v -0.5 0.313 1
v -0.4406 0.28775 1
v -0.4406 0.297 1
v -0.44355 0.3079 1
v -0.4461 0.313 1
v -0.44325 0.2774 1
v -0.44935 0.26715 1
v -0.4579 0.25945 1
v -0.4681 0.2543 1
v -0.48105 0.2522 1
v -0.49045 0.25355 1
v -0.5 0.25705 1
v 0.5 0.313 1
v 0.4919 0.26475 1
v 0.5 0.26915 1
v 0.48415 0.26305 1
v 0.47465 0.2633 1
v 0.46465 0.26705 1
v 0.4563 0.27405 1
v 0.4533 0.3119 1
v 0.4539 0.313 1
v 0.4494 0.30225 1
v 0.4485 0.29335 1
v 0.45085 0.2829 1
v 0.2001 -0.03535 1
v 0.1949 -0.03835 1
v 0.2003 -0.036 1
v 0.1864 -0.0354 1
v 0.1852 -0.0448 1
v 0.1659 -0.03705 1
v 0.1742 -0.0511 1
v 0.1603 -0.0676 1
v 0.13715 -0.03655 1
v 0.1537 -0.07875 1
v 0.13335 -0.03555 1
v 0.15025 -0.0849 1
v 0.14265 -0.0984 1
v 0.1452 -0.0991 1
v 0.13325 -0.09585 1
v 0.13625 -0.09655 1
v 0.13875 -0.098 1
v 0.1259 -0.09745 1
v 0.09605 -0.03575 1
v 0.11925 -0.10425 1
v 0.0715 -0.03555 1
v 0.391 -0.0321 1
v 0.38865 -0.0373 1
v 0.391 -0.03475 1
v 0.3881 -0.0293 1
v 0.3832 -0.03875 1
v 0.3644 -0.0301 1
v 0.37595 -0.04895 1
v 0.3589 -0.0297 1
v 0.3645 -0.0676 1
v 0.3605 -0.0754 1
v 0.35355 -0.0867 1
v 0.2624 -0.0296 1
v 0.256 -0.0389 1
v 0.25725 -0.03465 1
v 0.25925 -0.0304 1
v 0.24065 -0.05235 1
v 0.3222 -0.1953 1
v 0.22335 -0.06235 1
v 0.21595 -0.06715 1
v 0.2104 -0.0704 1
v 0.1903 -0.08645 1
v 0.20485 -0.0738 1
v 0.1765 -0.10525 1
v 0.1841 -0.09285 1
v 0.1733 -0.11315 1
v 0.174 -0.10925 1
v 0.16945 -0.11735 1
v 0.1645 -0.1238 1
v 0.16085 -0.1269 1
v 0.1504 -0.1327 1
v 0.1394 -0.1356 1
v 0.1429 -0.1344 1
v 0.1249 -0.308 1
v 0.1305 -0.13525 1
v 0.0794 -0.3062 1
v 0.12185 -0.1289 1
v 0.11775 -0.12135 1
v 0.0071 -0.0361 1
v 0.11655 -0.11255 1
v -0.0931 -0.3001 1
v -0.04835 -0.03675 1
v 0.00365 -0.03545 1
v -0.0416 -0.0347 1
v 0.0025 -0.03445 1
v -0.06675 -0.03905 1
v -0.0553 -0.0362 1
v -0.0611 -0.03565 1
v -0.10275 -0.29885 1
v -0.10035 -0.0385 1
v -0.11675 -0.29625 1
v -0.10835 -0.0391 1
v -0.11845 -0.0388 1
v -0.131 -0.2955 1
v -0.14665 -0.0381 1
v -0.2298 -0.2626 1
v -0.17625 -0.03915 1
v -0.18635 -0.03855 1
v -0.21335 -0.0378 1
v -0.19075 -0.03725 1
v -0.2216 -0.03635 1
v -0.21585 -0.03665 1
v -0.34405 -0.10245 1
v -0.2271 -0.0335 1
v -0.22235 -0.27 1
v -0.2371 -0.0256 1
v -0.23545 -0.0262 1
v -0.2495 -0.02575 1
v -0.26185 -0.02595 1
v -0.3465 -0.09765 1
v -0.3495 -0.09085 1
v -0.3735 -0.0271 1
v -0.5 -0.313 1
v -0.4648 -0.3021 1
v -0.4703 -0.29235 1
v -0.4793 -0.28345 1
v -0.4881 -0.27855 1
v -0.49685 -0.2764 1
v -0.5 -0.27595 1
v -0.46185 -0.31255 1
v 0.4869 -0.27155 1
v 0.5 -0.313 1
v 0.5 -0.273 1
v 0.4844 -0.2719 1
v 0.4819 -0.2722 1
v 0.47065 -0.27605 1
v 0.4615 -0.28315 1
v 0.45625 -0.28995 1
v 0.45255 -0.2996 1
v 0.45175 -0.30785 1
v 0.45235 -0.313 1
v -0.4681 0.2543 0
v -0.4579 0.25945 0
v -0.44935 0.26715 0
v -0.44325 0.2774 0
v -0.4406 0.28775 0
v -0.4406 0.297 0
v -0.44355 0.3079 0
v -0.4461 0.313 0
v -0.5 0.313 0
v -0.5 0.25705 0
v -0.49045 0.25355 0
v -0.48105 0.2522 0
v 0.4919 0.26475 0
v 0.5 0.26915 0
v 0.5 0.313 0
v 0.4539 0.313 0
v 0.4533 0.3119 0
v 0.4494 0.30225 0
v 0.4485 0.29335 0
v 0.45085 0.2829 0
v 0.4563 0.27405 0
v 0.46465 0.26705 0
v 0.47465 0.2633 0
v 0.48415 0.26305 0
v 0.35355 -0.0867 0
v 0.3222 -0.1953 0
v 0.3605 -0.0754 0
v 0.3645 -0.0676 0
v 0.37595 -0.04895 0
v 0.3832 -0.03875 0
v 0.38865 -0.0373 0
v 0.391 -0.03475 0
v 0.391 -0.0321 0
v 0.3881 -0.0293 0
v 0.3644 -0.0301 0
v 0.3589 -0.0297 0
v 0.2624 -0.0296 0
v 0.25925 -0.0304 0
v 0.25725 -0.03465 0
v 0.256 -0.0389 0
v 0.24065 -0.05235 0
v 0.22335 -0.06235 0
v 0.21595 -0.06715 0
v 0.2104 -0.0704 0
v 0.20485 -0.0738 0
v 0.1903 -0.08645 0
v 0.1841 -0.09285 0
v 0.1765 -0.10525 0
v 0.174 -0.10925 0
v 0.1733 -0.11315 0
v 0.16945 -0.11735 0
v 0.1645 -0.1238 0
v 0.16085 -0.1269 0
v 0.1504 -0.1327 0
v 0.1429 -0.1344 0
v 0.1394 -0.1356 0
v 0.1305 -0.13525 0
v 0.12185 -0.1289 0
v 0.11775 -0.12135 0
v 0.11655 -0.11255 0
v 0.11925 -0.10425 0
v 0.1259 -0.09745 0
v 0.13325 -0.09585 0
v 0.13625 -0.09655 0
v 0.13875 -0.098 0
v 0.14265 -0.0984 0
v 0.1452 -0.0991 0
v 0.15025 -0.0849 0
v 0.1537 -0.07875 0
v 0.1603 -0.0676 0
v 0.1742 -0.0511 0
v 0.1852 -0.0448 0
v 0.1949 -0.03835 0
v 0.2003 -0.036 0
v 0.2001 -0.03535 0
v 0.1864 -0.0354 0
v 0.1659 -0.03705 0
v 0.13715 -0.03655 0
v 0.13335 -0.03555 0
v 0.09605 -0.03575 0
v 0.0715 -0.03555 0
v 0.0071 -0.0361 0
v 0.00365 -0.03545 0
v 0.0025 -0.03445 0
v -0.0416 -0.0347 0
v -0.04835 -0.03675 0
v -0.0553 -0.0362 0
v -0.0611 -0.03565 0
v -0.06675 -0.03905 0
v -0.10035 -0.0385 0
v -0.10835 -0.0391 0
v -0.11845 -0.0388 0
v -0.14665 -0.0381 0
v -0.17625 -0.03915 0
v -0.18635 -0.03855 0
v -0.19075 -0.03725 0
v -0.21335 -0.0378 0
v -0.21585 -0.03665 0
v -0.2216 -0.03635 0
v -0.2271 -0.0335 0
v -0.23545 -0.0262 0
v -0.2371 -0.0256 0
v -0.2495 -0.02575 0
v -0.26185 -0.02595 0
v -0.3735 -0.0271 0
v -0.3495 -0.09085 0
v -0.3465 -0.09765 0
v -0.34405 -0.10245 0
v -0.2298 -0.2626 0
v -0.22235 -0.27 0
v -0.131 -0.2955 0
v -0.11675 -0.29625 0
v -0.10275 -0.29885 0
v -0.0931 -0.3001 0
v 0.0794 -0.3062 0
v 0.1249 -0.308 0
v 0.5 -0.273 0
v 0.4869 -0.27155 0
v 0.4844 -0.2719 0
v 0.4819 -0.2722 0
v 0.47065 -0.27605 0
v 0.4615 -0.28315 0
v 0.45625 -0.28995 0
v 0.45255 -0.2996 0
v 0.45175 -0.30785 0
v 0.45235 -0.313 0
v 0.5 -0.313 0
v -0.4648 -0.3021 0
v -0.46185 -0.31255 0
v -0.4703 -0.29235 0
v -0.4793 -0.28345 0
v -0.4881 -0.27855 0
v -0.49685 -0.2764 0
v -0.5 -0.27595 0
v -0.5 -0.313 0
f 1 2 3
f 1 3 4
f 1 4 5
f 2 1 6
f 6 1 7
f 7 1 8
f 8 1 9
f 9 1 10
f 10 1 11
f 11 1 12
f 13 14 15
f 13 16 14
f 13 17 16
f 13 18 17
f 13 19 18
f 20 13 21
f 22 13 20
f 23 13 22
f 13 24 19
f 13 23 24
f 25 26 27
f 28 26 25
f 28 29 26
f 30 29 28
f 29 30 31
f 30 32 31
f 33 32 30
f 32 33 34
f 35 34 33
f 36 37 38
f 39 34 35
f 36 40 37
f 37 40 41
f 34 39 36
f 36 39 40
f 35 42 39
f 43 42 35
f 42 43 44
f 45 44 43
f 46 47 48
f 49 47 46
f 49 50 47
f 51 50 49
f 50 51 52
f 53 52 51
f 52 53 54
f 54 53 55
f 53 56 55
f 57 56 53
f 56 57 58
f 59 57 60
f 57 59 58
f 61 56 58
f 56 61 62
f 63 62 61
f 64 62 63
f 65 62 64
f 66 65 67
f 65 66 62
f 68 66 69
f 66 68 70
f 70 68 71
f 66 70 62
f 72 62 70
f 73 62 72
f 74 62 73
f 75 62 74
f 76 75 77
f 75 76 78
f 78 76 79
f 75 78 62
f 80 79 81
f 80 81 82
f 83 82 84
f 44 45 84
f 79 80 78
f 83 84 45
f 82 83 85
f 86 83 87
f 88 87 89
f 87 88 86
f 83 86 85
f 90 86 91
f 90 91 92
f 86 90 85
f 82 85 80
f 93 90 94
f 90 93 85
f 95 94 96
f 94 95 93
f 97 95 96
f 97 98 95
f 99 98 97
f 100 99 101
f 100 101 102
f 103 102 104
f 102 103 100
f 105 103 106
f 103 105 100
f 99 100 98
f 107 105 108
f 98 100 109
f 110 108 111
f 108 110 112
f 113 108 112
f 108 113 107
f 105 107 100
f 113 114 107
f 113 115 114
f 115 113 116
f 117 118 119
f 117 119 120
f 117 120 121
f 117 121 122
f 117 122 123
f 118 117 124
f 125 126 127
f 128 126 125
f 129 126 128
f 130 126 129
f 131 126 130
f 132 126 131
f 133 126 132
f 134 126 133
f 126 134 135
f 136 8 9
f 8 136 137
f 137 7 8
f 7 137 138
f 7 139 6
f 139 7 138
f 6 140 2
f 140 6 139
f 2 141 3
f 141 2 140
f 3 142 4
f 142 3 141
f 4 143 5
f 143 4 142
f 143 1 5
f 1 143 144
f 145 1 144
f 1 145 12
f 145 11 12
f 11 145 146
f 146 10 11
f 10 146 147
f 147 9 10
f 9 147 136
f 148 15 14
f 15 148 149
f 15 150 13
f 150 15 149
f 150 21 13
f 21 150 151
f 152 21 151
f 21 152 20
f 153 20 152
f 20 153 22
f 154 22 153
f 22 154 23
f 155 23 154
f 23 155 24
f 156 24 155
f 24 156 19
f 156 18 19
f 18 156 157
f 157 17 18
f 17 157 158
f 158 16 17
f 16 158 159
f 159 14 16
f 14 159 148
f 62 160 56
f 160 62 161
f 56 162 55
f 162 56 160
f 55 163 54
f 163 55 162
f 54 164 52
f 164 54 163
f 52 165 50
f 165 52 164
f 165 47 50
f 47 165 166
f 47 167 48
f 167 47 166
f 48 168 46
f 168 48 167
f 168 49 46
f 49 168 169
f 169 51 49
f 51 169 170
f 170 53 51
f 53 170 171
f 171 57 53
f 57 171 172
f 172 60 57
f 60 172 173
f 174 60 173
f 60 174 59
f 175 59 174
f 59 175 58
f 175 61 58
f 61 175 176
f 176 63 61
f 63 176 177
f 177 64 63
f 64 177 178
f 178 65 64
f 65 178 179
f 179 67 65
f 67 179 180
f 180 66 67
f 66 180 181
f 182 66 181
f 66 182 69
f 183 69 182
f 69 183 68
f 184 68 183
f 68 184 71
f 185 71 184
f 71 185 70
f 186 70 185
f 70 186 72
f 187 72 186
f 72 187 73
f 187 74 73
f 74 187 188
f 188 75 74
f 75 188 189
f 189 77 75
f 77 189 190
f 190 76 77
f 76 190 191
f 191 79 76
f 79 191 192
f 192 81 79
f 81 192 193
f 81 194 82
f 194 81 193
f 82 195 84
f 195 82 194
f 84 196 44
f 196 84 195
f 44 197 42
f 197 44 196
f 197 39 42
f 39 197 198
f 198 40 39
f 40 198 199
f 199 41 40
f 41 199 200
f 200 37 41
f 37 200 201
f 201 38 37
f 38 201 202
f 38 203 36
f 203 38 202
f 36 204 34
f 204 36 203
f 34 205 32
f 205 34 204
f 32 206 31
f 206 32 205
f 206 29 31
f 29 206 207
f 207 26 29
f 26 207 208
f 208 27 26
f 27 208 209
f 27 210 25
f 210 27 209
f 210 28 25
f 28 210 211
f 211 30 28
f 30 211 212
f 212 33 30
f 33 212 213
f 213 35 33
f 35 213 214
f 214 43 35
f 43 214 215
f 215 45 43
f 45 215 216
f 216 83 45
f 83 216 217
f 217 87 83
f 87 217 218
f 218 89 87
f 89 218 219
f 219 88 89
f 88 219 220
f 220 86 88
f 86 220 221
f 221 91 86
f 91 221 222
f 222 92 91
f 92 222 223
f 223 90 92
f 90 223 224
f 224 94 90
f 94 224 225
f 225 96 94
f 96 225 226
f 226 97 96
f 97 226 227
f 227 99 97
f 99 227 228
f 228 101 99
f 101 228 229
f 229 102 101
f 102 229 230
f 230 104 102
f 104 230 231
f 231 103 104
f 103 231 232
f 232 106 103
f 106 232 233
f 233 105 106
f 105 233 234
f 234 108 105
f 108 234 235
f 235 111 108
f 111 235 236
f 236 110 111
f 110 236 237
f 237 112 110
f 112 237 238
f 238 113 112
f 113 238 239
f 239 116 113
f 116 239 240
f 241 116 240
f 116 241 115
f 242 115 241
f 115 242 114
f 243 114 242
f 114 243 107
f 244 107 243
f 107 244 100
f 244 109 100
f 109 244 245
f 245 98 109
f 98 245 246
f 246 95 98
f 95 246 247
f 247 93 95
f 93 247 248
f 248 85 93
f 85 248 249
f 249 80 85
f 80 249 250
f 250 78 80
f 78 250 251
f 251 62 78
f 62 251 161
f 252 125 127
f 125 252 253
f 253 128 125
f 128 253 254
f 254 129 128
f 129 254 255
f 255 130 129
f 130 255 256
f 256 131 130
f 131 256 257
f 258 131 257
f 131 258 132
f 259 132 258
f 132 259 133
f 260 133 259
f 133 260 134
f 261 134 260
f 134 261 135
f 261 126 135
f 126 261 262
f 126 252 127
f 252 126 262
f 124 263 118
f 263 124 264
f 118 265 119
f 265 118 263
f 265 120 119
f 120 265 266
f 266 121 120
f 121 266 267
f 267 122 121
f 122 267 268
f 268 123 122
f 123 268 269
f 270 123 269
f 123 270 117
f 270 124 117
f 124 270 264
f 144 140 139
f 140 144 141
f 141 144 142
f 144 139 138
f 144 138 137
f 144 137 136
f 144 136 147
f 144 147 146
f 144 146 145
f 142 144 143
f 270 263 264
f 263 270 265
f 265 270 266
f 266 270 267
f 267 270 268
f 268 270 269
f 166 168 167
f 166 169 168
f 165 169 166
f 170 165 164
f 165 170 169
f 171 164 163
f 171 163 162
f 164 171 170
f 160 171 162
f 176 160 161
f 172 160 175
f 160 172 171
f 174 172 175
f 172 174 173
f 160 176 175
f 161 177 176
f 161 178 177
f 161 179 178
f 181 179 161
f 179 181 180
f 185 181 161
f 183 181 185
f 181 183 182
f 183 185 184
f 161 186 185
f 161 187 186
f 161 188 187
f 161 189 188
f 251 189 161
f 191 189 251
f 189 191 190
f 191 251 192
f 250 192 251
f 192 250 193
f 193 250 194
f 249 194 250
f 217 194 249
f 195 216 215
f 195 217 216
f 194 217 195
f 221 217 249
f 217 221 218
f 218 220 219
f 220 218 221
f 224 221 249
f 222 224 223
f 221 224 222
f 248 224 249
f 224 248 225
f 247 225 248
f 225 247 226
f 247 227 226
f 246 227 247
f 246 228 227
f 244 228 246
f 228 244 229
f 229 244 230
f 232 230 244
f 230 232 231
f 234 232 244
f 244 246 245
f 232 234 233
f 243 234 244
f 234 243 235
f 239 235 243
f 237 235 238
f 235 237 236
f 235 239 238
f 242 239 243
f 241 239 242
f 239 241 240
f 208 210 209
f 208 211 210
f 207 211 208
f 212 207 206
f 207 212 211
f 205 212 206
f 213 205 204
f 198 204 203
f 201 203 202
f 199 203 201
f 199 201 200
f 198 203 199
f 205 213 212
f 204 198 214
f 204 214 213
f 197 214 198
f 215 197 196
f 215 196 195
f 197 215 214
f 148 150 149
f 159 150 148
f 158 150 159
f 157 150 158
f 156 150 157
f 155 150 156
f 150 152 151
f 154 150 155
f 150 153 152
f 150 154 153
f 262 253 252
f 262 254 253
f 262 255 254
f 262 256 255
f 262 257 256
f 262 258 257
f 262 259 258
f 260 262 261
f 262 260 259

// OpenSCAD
module fan9blue_1()
{
 /* Generated by trace2scad version 20150415
    http://aggregate.org/MAKE/TRACE2SCAD/
    Optimized model has 138/917 original points
 */
  minx=0; /* polygon minx=0 */
  miny=0; /* polygon miny=0 */
  maxx=20000; /* polygon maxx=20000 */
  maxy=12520; /* polygon maxy=12520 */
  dx=maxx-minx;
  dy=maxy-miny;
  maxd=((dx>dy)?dx:dy);
 scale([1/maxd, 1/maxd, 1])
 translate([-minx-dx/2, -miny-dy/2, 0])
 linear_extrude(height=1, convexity=138)
 union() {
  union() {
   polygon([[0,11961],[0,11401],[191,11331],[379,11304],[638,11346],[842,11449],[1013,11603],[1135,11808],[1188,12015],[1188,12200],[1129,12418],[1078,12520],[0,12520]], convexity=5);
   polygon([[19072,12509],[19066,12498],[18988,12305],[18970,12127],[19017,11918],[19126,11741],[19293,11601],[19493,11526],[19683,11521],[19838,11555],[20000,11643],[20000,12520],[19078,12520]], convexity=6);
   polygon([[5010,5745],[4763,5741],[2530,5718],[3010,4443],[3070,4307],[3119,4211],[5404,1008],[5553,860],[7380,350],[7665,335],[7945,283],[8138,258],[11588,136],[12498,100],[16444,2354],[17071,4526],[17210,4752],[17290,4908],[17519,5281],[17664,5485],[17773,5514],[17820,5565],[17820,5618],[17762,5674],[17288,5658],[17178,5666],[15248,5668],[15185,5652],[15145,5567],[15120,5482],[14813,5213],[14467,5013],[14319,4917],[14208,4852],[14097,4784],[13806,4531],[13682,4403],[13530,4155],[13480,4075],[13466,3997],[13389,3913],[13290,3784],[13217,3722],[13008,3606],[12858,3572],[12788,3548],[12610,3555],[12437,3682],[12355,3833],[12331,4009],[12385,4175],[12518,4311],[12665,4343],[12725,4329],[12775,4300],[12853,4292],[12904,4278],[13005,4562],[13074,4685],[13206,4908],[13484,5238],[13704,5364],[13898,5493],[14006,5540],[14002,5553],[13728,5552],[13318,5519],[12743,5529],[12667,5549],[11921,5545],[11430,5549],[10142,5538],[10073,5551],[10050,5571],[9168,5566],[9033,5525],[8894,5536],[8778,5547],[8665,5479],[7993,5490],[7833,5478],[7631,5484],[7067,5498],[6475,5477],[6273,5489],[6185,5515],[5733,5504],[5683,5527],[5568,5533],[5458,5590],[5291,5736],[5258,5748]], convexity=30);
   polygon([[19688,822],[19638,816],[19413,739],[19230,597],[19125,461],[19051,268],[19035,103],[19047,0],[20000,0],[20000,800],[19738,829]], convexity=6);
   polygon([[0,371],[0,0],[763,9],[704,218],[594,413],[414,591],[238,689],[63,732],[0,741]], convexity=5);
  }
 }
}

module fan9blue()
{
 /* all layers combined, scaled to within a 1mm cube */
 scale([1, 1, 1/1])
 difference() {
  union() {
   scale([1,1,2]) translate([0,0,-0.5]) fan9blue_1();
  }
  translate([0,0,-2]) cube([2,2,4],center=true);
 }
}
fan9blue();
